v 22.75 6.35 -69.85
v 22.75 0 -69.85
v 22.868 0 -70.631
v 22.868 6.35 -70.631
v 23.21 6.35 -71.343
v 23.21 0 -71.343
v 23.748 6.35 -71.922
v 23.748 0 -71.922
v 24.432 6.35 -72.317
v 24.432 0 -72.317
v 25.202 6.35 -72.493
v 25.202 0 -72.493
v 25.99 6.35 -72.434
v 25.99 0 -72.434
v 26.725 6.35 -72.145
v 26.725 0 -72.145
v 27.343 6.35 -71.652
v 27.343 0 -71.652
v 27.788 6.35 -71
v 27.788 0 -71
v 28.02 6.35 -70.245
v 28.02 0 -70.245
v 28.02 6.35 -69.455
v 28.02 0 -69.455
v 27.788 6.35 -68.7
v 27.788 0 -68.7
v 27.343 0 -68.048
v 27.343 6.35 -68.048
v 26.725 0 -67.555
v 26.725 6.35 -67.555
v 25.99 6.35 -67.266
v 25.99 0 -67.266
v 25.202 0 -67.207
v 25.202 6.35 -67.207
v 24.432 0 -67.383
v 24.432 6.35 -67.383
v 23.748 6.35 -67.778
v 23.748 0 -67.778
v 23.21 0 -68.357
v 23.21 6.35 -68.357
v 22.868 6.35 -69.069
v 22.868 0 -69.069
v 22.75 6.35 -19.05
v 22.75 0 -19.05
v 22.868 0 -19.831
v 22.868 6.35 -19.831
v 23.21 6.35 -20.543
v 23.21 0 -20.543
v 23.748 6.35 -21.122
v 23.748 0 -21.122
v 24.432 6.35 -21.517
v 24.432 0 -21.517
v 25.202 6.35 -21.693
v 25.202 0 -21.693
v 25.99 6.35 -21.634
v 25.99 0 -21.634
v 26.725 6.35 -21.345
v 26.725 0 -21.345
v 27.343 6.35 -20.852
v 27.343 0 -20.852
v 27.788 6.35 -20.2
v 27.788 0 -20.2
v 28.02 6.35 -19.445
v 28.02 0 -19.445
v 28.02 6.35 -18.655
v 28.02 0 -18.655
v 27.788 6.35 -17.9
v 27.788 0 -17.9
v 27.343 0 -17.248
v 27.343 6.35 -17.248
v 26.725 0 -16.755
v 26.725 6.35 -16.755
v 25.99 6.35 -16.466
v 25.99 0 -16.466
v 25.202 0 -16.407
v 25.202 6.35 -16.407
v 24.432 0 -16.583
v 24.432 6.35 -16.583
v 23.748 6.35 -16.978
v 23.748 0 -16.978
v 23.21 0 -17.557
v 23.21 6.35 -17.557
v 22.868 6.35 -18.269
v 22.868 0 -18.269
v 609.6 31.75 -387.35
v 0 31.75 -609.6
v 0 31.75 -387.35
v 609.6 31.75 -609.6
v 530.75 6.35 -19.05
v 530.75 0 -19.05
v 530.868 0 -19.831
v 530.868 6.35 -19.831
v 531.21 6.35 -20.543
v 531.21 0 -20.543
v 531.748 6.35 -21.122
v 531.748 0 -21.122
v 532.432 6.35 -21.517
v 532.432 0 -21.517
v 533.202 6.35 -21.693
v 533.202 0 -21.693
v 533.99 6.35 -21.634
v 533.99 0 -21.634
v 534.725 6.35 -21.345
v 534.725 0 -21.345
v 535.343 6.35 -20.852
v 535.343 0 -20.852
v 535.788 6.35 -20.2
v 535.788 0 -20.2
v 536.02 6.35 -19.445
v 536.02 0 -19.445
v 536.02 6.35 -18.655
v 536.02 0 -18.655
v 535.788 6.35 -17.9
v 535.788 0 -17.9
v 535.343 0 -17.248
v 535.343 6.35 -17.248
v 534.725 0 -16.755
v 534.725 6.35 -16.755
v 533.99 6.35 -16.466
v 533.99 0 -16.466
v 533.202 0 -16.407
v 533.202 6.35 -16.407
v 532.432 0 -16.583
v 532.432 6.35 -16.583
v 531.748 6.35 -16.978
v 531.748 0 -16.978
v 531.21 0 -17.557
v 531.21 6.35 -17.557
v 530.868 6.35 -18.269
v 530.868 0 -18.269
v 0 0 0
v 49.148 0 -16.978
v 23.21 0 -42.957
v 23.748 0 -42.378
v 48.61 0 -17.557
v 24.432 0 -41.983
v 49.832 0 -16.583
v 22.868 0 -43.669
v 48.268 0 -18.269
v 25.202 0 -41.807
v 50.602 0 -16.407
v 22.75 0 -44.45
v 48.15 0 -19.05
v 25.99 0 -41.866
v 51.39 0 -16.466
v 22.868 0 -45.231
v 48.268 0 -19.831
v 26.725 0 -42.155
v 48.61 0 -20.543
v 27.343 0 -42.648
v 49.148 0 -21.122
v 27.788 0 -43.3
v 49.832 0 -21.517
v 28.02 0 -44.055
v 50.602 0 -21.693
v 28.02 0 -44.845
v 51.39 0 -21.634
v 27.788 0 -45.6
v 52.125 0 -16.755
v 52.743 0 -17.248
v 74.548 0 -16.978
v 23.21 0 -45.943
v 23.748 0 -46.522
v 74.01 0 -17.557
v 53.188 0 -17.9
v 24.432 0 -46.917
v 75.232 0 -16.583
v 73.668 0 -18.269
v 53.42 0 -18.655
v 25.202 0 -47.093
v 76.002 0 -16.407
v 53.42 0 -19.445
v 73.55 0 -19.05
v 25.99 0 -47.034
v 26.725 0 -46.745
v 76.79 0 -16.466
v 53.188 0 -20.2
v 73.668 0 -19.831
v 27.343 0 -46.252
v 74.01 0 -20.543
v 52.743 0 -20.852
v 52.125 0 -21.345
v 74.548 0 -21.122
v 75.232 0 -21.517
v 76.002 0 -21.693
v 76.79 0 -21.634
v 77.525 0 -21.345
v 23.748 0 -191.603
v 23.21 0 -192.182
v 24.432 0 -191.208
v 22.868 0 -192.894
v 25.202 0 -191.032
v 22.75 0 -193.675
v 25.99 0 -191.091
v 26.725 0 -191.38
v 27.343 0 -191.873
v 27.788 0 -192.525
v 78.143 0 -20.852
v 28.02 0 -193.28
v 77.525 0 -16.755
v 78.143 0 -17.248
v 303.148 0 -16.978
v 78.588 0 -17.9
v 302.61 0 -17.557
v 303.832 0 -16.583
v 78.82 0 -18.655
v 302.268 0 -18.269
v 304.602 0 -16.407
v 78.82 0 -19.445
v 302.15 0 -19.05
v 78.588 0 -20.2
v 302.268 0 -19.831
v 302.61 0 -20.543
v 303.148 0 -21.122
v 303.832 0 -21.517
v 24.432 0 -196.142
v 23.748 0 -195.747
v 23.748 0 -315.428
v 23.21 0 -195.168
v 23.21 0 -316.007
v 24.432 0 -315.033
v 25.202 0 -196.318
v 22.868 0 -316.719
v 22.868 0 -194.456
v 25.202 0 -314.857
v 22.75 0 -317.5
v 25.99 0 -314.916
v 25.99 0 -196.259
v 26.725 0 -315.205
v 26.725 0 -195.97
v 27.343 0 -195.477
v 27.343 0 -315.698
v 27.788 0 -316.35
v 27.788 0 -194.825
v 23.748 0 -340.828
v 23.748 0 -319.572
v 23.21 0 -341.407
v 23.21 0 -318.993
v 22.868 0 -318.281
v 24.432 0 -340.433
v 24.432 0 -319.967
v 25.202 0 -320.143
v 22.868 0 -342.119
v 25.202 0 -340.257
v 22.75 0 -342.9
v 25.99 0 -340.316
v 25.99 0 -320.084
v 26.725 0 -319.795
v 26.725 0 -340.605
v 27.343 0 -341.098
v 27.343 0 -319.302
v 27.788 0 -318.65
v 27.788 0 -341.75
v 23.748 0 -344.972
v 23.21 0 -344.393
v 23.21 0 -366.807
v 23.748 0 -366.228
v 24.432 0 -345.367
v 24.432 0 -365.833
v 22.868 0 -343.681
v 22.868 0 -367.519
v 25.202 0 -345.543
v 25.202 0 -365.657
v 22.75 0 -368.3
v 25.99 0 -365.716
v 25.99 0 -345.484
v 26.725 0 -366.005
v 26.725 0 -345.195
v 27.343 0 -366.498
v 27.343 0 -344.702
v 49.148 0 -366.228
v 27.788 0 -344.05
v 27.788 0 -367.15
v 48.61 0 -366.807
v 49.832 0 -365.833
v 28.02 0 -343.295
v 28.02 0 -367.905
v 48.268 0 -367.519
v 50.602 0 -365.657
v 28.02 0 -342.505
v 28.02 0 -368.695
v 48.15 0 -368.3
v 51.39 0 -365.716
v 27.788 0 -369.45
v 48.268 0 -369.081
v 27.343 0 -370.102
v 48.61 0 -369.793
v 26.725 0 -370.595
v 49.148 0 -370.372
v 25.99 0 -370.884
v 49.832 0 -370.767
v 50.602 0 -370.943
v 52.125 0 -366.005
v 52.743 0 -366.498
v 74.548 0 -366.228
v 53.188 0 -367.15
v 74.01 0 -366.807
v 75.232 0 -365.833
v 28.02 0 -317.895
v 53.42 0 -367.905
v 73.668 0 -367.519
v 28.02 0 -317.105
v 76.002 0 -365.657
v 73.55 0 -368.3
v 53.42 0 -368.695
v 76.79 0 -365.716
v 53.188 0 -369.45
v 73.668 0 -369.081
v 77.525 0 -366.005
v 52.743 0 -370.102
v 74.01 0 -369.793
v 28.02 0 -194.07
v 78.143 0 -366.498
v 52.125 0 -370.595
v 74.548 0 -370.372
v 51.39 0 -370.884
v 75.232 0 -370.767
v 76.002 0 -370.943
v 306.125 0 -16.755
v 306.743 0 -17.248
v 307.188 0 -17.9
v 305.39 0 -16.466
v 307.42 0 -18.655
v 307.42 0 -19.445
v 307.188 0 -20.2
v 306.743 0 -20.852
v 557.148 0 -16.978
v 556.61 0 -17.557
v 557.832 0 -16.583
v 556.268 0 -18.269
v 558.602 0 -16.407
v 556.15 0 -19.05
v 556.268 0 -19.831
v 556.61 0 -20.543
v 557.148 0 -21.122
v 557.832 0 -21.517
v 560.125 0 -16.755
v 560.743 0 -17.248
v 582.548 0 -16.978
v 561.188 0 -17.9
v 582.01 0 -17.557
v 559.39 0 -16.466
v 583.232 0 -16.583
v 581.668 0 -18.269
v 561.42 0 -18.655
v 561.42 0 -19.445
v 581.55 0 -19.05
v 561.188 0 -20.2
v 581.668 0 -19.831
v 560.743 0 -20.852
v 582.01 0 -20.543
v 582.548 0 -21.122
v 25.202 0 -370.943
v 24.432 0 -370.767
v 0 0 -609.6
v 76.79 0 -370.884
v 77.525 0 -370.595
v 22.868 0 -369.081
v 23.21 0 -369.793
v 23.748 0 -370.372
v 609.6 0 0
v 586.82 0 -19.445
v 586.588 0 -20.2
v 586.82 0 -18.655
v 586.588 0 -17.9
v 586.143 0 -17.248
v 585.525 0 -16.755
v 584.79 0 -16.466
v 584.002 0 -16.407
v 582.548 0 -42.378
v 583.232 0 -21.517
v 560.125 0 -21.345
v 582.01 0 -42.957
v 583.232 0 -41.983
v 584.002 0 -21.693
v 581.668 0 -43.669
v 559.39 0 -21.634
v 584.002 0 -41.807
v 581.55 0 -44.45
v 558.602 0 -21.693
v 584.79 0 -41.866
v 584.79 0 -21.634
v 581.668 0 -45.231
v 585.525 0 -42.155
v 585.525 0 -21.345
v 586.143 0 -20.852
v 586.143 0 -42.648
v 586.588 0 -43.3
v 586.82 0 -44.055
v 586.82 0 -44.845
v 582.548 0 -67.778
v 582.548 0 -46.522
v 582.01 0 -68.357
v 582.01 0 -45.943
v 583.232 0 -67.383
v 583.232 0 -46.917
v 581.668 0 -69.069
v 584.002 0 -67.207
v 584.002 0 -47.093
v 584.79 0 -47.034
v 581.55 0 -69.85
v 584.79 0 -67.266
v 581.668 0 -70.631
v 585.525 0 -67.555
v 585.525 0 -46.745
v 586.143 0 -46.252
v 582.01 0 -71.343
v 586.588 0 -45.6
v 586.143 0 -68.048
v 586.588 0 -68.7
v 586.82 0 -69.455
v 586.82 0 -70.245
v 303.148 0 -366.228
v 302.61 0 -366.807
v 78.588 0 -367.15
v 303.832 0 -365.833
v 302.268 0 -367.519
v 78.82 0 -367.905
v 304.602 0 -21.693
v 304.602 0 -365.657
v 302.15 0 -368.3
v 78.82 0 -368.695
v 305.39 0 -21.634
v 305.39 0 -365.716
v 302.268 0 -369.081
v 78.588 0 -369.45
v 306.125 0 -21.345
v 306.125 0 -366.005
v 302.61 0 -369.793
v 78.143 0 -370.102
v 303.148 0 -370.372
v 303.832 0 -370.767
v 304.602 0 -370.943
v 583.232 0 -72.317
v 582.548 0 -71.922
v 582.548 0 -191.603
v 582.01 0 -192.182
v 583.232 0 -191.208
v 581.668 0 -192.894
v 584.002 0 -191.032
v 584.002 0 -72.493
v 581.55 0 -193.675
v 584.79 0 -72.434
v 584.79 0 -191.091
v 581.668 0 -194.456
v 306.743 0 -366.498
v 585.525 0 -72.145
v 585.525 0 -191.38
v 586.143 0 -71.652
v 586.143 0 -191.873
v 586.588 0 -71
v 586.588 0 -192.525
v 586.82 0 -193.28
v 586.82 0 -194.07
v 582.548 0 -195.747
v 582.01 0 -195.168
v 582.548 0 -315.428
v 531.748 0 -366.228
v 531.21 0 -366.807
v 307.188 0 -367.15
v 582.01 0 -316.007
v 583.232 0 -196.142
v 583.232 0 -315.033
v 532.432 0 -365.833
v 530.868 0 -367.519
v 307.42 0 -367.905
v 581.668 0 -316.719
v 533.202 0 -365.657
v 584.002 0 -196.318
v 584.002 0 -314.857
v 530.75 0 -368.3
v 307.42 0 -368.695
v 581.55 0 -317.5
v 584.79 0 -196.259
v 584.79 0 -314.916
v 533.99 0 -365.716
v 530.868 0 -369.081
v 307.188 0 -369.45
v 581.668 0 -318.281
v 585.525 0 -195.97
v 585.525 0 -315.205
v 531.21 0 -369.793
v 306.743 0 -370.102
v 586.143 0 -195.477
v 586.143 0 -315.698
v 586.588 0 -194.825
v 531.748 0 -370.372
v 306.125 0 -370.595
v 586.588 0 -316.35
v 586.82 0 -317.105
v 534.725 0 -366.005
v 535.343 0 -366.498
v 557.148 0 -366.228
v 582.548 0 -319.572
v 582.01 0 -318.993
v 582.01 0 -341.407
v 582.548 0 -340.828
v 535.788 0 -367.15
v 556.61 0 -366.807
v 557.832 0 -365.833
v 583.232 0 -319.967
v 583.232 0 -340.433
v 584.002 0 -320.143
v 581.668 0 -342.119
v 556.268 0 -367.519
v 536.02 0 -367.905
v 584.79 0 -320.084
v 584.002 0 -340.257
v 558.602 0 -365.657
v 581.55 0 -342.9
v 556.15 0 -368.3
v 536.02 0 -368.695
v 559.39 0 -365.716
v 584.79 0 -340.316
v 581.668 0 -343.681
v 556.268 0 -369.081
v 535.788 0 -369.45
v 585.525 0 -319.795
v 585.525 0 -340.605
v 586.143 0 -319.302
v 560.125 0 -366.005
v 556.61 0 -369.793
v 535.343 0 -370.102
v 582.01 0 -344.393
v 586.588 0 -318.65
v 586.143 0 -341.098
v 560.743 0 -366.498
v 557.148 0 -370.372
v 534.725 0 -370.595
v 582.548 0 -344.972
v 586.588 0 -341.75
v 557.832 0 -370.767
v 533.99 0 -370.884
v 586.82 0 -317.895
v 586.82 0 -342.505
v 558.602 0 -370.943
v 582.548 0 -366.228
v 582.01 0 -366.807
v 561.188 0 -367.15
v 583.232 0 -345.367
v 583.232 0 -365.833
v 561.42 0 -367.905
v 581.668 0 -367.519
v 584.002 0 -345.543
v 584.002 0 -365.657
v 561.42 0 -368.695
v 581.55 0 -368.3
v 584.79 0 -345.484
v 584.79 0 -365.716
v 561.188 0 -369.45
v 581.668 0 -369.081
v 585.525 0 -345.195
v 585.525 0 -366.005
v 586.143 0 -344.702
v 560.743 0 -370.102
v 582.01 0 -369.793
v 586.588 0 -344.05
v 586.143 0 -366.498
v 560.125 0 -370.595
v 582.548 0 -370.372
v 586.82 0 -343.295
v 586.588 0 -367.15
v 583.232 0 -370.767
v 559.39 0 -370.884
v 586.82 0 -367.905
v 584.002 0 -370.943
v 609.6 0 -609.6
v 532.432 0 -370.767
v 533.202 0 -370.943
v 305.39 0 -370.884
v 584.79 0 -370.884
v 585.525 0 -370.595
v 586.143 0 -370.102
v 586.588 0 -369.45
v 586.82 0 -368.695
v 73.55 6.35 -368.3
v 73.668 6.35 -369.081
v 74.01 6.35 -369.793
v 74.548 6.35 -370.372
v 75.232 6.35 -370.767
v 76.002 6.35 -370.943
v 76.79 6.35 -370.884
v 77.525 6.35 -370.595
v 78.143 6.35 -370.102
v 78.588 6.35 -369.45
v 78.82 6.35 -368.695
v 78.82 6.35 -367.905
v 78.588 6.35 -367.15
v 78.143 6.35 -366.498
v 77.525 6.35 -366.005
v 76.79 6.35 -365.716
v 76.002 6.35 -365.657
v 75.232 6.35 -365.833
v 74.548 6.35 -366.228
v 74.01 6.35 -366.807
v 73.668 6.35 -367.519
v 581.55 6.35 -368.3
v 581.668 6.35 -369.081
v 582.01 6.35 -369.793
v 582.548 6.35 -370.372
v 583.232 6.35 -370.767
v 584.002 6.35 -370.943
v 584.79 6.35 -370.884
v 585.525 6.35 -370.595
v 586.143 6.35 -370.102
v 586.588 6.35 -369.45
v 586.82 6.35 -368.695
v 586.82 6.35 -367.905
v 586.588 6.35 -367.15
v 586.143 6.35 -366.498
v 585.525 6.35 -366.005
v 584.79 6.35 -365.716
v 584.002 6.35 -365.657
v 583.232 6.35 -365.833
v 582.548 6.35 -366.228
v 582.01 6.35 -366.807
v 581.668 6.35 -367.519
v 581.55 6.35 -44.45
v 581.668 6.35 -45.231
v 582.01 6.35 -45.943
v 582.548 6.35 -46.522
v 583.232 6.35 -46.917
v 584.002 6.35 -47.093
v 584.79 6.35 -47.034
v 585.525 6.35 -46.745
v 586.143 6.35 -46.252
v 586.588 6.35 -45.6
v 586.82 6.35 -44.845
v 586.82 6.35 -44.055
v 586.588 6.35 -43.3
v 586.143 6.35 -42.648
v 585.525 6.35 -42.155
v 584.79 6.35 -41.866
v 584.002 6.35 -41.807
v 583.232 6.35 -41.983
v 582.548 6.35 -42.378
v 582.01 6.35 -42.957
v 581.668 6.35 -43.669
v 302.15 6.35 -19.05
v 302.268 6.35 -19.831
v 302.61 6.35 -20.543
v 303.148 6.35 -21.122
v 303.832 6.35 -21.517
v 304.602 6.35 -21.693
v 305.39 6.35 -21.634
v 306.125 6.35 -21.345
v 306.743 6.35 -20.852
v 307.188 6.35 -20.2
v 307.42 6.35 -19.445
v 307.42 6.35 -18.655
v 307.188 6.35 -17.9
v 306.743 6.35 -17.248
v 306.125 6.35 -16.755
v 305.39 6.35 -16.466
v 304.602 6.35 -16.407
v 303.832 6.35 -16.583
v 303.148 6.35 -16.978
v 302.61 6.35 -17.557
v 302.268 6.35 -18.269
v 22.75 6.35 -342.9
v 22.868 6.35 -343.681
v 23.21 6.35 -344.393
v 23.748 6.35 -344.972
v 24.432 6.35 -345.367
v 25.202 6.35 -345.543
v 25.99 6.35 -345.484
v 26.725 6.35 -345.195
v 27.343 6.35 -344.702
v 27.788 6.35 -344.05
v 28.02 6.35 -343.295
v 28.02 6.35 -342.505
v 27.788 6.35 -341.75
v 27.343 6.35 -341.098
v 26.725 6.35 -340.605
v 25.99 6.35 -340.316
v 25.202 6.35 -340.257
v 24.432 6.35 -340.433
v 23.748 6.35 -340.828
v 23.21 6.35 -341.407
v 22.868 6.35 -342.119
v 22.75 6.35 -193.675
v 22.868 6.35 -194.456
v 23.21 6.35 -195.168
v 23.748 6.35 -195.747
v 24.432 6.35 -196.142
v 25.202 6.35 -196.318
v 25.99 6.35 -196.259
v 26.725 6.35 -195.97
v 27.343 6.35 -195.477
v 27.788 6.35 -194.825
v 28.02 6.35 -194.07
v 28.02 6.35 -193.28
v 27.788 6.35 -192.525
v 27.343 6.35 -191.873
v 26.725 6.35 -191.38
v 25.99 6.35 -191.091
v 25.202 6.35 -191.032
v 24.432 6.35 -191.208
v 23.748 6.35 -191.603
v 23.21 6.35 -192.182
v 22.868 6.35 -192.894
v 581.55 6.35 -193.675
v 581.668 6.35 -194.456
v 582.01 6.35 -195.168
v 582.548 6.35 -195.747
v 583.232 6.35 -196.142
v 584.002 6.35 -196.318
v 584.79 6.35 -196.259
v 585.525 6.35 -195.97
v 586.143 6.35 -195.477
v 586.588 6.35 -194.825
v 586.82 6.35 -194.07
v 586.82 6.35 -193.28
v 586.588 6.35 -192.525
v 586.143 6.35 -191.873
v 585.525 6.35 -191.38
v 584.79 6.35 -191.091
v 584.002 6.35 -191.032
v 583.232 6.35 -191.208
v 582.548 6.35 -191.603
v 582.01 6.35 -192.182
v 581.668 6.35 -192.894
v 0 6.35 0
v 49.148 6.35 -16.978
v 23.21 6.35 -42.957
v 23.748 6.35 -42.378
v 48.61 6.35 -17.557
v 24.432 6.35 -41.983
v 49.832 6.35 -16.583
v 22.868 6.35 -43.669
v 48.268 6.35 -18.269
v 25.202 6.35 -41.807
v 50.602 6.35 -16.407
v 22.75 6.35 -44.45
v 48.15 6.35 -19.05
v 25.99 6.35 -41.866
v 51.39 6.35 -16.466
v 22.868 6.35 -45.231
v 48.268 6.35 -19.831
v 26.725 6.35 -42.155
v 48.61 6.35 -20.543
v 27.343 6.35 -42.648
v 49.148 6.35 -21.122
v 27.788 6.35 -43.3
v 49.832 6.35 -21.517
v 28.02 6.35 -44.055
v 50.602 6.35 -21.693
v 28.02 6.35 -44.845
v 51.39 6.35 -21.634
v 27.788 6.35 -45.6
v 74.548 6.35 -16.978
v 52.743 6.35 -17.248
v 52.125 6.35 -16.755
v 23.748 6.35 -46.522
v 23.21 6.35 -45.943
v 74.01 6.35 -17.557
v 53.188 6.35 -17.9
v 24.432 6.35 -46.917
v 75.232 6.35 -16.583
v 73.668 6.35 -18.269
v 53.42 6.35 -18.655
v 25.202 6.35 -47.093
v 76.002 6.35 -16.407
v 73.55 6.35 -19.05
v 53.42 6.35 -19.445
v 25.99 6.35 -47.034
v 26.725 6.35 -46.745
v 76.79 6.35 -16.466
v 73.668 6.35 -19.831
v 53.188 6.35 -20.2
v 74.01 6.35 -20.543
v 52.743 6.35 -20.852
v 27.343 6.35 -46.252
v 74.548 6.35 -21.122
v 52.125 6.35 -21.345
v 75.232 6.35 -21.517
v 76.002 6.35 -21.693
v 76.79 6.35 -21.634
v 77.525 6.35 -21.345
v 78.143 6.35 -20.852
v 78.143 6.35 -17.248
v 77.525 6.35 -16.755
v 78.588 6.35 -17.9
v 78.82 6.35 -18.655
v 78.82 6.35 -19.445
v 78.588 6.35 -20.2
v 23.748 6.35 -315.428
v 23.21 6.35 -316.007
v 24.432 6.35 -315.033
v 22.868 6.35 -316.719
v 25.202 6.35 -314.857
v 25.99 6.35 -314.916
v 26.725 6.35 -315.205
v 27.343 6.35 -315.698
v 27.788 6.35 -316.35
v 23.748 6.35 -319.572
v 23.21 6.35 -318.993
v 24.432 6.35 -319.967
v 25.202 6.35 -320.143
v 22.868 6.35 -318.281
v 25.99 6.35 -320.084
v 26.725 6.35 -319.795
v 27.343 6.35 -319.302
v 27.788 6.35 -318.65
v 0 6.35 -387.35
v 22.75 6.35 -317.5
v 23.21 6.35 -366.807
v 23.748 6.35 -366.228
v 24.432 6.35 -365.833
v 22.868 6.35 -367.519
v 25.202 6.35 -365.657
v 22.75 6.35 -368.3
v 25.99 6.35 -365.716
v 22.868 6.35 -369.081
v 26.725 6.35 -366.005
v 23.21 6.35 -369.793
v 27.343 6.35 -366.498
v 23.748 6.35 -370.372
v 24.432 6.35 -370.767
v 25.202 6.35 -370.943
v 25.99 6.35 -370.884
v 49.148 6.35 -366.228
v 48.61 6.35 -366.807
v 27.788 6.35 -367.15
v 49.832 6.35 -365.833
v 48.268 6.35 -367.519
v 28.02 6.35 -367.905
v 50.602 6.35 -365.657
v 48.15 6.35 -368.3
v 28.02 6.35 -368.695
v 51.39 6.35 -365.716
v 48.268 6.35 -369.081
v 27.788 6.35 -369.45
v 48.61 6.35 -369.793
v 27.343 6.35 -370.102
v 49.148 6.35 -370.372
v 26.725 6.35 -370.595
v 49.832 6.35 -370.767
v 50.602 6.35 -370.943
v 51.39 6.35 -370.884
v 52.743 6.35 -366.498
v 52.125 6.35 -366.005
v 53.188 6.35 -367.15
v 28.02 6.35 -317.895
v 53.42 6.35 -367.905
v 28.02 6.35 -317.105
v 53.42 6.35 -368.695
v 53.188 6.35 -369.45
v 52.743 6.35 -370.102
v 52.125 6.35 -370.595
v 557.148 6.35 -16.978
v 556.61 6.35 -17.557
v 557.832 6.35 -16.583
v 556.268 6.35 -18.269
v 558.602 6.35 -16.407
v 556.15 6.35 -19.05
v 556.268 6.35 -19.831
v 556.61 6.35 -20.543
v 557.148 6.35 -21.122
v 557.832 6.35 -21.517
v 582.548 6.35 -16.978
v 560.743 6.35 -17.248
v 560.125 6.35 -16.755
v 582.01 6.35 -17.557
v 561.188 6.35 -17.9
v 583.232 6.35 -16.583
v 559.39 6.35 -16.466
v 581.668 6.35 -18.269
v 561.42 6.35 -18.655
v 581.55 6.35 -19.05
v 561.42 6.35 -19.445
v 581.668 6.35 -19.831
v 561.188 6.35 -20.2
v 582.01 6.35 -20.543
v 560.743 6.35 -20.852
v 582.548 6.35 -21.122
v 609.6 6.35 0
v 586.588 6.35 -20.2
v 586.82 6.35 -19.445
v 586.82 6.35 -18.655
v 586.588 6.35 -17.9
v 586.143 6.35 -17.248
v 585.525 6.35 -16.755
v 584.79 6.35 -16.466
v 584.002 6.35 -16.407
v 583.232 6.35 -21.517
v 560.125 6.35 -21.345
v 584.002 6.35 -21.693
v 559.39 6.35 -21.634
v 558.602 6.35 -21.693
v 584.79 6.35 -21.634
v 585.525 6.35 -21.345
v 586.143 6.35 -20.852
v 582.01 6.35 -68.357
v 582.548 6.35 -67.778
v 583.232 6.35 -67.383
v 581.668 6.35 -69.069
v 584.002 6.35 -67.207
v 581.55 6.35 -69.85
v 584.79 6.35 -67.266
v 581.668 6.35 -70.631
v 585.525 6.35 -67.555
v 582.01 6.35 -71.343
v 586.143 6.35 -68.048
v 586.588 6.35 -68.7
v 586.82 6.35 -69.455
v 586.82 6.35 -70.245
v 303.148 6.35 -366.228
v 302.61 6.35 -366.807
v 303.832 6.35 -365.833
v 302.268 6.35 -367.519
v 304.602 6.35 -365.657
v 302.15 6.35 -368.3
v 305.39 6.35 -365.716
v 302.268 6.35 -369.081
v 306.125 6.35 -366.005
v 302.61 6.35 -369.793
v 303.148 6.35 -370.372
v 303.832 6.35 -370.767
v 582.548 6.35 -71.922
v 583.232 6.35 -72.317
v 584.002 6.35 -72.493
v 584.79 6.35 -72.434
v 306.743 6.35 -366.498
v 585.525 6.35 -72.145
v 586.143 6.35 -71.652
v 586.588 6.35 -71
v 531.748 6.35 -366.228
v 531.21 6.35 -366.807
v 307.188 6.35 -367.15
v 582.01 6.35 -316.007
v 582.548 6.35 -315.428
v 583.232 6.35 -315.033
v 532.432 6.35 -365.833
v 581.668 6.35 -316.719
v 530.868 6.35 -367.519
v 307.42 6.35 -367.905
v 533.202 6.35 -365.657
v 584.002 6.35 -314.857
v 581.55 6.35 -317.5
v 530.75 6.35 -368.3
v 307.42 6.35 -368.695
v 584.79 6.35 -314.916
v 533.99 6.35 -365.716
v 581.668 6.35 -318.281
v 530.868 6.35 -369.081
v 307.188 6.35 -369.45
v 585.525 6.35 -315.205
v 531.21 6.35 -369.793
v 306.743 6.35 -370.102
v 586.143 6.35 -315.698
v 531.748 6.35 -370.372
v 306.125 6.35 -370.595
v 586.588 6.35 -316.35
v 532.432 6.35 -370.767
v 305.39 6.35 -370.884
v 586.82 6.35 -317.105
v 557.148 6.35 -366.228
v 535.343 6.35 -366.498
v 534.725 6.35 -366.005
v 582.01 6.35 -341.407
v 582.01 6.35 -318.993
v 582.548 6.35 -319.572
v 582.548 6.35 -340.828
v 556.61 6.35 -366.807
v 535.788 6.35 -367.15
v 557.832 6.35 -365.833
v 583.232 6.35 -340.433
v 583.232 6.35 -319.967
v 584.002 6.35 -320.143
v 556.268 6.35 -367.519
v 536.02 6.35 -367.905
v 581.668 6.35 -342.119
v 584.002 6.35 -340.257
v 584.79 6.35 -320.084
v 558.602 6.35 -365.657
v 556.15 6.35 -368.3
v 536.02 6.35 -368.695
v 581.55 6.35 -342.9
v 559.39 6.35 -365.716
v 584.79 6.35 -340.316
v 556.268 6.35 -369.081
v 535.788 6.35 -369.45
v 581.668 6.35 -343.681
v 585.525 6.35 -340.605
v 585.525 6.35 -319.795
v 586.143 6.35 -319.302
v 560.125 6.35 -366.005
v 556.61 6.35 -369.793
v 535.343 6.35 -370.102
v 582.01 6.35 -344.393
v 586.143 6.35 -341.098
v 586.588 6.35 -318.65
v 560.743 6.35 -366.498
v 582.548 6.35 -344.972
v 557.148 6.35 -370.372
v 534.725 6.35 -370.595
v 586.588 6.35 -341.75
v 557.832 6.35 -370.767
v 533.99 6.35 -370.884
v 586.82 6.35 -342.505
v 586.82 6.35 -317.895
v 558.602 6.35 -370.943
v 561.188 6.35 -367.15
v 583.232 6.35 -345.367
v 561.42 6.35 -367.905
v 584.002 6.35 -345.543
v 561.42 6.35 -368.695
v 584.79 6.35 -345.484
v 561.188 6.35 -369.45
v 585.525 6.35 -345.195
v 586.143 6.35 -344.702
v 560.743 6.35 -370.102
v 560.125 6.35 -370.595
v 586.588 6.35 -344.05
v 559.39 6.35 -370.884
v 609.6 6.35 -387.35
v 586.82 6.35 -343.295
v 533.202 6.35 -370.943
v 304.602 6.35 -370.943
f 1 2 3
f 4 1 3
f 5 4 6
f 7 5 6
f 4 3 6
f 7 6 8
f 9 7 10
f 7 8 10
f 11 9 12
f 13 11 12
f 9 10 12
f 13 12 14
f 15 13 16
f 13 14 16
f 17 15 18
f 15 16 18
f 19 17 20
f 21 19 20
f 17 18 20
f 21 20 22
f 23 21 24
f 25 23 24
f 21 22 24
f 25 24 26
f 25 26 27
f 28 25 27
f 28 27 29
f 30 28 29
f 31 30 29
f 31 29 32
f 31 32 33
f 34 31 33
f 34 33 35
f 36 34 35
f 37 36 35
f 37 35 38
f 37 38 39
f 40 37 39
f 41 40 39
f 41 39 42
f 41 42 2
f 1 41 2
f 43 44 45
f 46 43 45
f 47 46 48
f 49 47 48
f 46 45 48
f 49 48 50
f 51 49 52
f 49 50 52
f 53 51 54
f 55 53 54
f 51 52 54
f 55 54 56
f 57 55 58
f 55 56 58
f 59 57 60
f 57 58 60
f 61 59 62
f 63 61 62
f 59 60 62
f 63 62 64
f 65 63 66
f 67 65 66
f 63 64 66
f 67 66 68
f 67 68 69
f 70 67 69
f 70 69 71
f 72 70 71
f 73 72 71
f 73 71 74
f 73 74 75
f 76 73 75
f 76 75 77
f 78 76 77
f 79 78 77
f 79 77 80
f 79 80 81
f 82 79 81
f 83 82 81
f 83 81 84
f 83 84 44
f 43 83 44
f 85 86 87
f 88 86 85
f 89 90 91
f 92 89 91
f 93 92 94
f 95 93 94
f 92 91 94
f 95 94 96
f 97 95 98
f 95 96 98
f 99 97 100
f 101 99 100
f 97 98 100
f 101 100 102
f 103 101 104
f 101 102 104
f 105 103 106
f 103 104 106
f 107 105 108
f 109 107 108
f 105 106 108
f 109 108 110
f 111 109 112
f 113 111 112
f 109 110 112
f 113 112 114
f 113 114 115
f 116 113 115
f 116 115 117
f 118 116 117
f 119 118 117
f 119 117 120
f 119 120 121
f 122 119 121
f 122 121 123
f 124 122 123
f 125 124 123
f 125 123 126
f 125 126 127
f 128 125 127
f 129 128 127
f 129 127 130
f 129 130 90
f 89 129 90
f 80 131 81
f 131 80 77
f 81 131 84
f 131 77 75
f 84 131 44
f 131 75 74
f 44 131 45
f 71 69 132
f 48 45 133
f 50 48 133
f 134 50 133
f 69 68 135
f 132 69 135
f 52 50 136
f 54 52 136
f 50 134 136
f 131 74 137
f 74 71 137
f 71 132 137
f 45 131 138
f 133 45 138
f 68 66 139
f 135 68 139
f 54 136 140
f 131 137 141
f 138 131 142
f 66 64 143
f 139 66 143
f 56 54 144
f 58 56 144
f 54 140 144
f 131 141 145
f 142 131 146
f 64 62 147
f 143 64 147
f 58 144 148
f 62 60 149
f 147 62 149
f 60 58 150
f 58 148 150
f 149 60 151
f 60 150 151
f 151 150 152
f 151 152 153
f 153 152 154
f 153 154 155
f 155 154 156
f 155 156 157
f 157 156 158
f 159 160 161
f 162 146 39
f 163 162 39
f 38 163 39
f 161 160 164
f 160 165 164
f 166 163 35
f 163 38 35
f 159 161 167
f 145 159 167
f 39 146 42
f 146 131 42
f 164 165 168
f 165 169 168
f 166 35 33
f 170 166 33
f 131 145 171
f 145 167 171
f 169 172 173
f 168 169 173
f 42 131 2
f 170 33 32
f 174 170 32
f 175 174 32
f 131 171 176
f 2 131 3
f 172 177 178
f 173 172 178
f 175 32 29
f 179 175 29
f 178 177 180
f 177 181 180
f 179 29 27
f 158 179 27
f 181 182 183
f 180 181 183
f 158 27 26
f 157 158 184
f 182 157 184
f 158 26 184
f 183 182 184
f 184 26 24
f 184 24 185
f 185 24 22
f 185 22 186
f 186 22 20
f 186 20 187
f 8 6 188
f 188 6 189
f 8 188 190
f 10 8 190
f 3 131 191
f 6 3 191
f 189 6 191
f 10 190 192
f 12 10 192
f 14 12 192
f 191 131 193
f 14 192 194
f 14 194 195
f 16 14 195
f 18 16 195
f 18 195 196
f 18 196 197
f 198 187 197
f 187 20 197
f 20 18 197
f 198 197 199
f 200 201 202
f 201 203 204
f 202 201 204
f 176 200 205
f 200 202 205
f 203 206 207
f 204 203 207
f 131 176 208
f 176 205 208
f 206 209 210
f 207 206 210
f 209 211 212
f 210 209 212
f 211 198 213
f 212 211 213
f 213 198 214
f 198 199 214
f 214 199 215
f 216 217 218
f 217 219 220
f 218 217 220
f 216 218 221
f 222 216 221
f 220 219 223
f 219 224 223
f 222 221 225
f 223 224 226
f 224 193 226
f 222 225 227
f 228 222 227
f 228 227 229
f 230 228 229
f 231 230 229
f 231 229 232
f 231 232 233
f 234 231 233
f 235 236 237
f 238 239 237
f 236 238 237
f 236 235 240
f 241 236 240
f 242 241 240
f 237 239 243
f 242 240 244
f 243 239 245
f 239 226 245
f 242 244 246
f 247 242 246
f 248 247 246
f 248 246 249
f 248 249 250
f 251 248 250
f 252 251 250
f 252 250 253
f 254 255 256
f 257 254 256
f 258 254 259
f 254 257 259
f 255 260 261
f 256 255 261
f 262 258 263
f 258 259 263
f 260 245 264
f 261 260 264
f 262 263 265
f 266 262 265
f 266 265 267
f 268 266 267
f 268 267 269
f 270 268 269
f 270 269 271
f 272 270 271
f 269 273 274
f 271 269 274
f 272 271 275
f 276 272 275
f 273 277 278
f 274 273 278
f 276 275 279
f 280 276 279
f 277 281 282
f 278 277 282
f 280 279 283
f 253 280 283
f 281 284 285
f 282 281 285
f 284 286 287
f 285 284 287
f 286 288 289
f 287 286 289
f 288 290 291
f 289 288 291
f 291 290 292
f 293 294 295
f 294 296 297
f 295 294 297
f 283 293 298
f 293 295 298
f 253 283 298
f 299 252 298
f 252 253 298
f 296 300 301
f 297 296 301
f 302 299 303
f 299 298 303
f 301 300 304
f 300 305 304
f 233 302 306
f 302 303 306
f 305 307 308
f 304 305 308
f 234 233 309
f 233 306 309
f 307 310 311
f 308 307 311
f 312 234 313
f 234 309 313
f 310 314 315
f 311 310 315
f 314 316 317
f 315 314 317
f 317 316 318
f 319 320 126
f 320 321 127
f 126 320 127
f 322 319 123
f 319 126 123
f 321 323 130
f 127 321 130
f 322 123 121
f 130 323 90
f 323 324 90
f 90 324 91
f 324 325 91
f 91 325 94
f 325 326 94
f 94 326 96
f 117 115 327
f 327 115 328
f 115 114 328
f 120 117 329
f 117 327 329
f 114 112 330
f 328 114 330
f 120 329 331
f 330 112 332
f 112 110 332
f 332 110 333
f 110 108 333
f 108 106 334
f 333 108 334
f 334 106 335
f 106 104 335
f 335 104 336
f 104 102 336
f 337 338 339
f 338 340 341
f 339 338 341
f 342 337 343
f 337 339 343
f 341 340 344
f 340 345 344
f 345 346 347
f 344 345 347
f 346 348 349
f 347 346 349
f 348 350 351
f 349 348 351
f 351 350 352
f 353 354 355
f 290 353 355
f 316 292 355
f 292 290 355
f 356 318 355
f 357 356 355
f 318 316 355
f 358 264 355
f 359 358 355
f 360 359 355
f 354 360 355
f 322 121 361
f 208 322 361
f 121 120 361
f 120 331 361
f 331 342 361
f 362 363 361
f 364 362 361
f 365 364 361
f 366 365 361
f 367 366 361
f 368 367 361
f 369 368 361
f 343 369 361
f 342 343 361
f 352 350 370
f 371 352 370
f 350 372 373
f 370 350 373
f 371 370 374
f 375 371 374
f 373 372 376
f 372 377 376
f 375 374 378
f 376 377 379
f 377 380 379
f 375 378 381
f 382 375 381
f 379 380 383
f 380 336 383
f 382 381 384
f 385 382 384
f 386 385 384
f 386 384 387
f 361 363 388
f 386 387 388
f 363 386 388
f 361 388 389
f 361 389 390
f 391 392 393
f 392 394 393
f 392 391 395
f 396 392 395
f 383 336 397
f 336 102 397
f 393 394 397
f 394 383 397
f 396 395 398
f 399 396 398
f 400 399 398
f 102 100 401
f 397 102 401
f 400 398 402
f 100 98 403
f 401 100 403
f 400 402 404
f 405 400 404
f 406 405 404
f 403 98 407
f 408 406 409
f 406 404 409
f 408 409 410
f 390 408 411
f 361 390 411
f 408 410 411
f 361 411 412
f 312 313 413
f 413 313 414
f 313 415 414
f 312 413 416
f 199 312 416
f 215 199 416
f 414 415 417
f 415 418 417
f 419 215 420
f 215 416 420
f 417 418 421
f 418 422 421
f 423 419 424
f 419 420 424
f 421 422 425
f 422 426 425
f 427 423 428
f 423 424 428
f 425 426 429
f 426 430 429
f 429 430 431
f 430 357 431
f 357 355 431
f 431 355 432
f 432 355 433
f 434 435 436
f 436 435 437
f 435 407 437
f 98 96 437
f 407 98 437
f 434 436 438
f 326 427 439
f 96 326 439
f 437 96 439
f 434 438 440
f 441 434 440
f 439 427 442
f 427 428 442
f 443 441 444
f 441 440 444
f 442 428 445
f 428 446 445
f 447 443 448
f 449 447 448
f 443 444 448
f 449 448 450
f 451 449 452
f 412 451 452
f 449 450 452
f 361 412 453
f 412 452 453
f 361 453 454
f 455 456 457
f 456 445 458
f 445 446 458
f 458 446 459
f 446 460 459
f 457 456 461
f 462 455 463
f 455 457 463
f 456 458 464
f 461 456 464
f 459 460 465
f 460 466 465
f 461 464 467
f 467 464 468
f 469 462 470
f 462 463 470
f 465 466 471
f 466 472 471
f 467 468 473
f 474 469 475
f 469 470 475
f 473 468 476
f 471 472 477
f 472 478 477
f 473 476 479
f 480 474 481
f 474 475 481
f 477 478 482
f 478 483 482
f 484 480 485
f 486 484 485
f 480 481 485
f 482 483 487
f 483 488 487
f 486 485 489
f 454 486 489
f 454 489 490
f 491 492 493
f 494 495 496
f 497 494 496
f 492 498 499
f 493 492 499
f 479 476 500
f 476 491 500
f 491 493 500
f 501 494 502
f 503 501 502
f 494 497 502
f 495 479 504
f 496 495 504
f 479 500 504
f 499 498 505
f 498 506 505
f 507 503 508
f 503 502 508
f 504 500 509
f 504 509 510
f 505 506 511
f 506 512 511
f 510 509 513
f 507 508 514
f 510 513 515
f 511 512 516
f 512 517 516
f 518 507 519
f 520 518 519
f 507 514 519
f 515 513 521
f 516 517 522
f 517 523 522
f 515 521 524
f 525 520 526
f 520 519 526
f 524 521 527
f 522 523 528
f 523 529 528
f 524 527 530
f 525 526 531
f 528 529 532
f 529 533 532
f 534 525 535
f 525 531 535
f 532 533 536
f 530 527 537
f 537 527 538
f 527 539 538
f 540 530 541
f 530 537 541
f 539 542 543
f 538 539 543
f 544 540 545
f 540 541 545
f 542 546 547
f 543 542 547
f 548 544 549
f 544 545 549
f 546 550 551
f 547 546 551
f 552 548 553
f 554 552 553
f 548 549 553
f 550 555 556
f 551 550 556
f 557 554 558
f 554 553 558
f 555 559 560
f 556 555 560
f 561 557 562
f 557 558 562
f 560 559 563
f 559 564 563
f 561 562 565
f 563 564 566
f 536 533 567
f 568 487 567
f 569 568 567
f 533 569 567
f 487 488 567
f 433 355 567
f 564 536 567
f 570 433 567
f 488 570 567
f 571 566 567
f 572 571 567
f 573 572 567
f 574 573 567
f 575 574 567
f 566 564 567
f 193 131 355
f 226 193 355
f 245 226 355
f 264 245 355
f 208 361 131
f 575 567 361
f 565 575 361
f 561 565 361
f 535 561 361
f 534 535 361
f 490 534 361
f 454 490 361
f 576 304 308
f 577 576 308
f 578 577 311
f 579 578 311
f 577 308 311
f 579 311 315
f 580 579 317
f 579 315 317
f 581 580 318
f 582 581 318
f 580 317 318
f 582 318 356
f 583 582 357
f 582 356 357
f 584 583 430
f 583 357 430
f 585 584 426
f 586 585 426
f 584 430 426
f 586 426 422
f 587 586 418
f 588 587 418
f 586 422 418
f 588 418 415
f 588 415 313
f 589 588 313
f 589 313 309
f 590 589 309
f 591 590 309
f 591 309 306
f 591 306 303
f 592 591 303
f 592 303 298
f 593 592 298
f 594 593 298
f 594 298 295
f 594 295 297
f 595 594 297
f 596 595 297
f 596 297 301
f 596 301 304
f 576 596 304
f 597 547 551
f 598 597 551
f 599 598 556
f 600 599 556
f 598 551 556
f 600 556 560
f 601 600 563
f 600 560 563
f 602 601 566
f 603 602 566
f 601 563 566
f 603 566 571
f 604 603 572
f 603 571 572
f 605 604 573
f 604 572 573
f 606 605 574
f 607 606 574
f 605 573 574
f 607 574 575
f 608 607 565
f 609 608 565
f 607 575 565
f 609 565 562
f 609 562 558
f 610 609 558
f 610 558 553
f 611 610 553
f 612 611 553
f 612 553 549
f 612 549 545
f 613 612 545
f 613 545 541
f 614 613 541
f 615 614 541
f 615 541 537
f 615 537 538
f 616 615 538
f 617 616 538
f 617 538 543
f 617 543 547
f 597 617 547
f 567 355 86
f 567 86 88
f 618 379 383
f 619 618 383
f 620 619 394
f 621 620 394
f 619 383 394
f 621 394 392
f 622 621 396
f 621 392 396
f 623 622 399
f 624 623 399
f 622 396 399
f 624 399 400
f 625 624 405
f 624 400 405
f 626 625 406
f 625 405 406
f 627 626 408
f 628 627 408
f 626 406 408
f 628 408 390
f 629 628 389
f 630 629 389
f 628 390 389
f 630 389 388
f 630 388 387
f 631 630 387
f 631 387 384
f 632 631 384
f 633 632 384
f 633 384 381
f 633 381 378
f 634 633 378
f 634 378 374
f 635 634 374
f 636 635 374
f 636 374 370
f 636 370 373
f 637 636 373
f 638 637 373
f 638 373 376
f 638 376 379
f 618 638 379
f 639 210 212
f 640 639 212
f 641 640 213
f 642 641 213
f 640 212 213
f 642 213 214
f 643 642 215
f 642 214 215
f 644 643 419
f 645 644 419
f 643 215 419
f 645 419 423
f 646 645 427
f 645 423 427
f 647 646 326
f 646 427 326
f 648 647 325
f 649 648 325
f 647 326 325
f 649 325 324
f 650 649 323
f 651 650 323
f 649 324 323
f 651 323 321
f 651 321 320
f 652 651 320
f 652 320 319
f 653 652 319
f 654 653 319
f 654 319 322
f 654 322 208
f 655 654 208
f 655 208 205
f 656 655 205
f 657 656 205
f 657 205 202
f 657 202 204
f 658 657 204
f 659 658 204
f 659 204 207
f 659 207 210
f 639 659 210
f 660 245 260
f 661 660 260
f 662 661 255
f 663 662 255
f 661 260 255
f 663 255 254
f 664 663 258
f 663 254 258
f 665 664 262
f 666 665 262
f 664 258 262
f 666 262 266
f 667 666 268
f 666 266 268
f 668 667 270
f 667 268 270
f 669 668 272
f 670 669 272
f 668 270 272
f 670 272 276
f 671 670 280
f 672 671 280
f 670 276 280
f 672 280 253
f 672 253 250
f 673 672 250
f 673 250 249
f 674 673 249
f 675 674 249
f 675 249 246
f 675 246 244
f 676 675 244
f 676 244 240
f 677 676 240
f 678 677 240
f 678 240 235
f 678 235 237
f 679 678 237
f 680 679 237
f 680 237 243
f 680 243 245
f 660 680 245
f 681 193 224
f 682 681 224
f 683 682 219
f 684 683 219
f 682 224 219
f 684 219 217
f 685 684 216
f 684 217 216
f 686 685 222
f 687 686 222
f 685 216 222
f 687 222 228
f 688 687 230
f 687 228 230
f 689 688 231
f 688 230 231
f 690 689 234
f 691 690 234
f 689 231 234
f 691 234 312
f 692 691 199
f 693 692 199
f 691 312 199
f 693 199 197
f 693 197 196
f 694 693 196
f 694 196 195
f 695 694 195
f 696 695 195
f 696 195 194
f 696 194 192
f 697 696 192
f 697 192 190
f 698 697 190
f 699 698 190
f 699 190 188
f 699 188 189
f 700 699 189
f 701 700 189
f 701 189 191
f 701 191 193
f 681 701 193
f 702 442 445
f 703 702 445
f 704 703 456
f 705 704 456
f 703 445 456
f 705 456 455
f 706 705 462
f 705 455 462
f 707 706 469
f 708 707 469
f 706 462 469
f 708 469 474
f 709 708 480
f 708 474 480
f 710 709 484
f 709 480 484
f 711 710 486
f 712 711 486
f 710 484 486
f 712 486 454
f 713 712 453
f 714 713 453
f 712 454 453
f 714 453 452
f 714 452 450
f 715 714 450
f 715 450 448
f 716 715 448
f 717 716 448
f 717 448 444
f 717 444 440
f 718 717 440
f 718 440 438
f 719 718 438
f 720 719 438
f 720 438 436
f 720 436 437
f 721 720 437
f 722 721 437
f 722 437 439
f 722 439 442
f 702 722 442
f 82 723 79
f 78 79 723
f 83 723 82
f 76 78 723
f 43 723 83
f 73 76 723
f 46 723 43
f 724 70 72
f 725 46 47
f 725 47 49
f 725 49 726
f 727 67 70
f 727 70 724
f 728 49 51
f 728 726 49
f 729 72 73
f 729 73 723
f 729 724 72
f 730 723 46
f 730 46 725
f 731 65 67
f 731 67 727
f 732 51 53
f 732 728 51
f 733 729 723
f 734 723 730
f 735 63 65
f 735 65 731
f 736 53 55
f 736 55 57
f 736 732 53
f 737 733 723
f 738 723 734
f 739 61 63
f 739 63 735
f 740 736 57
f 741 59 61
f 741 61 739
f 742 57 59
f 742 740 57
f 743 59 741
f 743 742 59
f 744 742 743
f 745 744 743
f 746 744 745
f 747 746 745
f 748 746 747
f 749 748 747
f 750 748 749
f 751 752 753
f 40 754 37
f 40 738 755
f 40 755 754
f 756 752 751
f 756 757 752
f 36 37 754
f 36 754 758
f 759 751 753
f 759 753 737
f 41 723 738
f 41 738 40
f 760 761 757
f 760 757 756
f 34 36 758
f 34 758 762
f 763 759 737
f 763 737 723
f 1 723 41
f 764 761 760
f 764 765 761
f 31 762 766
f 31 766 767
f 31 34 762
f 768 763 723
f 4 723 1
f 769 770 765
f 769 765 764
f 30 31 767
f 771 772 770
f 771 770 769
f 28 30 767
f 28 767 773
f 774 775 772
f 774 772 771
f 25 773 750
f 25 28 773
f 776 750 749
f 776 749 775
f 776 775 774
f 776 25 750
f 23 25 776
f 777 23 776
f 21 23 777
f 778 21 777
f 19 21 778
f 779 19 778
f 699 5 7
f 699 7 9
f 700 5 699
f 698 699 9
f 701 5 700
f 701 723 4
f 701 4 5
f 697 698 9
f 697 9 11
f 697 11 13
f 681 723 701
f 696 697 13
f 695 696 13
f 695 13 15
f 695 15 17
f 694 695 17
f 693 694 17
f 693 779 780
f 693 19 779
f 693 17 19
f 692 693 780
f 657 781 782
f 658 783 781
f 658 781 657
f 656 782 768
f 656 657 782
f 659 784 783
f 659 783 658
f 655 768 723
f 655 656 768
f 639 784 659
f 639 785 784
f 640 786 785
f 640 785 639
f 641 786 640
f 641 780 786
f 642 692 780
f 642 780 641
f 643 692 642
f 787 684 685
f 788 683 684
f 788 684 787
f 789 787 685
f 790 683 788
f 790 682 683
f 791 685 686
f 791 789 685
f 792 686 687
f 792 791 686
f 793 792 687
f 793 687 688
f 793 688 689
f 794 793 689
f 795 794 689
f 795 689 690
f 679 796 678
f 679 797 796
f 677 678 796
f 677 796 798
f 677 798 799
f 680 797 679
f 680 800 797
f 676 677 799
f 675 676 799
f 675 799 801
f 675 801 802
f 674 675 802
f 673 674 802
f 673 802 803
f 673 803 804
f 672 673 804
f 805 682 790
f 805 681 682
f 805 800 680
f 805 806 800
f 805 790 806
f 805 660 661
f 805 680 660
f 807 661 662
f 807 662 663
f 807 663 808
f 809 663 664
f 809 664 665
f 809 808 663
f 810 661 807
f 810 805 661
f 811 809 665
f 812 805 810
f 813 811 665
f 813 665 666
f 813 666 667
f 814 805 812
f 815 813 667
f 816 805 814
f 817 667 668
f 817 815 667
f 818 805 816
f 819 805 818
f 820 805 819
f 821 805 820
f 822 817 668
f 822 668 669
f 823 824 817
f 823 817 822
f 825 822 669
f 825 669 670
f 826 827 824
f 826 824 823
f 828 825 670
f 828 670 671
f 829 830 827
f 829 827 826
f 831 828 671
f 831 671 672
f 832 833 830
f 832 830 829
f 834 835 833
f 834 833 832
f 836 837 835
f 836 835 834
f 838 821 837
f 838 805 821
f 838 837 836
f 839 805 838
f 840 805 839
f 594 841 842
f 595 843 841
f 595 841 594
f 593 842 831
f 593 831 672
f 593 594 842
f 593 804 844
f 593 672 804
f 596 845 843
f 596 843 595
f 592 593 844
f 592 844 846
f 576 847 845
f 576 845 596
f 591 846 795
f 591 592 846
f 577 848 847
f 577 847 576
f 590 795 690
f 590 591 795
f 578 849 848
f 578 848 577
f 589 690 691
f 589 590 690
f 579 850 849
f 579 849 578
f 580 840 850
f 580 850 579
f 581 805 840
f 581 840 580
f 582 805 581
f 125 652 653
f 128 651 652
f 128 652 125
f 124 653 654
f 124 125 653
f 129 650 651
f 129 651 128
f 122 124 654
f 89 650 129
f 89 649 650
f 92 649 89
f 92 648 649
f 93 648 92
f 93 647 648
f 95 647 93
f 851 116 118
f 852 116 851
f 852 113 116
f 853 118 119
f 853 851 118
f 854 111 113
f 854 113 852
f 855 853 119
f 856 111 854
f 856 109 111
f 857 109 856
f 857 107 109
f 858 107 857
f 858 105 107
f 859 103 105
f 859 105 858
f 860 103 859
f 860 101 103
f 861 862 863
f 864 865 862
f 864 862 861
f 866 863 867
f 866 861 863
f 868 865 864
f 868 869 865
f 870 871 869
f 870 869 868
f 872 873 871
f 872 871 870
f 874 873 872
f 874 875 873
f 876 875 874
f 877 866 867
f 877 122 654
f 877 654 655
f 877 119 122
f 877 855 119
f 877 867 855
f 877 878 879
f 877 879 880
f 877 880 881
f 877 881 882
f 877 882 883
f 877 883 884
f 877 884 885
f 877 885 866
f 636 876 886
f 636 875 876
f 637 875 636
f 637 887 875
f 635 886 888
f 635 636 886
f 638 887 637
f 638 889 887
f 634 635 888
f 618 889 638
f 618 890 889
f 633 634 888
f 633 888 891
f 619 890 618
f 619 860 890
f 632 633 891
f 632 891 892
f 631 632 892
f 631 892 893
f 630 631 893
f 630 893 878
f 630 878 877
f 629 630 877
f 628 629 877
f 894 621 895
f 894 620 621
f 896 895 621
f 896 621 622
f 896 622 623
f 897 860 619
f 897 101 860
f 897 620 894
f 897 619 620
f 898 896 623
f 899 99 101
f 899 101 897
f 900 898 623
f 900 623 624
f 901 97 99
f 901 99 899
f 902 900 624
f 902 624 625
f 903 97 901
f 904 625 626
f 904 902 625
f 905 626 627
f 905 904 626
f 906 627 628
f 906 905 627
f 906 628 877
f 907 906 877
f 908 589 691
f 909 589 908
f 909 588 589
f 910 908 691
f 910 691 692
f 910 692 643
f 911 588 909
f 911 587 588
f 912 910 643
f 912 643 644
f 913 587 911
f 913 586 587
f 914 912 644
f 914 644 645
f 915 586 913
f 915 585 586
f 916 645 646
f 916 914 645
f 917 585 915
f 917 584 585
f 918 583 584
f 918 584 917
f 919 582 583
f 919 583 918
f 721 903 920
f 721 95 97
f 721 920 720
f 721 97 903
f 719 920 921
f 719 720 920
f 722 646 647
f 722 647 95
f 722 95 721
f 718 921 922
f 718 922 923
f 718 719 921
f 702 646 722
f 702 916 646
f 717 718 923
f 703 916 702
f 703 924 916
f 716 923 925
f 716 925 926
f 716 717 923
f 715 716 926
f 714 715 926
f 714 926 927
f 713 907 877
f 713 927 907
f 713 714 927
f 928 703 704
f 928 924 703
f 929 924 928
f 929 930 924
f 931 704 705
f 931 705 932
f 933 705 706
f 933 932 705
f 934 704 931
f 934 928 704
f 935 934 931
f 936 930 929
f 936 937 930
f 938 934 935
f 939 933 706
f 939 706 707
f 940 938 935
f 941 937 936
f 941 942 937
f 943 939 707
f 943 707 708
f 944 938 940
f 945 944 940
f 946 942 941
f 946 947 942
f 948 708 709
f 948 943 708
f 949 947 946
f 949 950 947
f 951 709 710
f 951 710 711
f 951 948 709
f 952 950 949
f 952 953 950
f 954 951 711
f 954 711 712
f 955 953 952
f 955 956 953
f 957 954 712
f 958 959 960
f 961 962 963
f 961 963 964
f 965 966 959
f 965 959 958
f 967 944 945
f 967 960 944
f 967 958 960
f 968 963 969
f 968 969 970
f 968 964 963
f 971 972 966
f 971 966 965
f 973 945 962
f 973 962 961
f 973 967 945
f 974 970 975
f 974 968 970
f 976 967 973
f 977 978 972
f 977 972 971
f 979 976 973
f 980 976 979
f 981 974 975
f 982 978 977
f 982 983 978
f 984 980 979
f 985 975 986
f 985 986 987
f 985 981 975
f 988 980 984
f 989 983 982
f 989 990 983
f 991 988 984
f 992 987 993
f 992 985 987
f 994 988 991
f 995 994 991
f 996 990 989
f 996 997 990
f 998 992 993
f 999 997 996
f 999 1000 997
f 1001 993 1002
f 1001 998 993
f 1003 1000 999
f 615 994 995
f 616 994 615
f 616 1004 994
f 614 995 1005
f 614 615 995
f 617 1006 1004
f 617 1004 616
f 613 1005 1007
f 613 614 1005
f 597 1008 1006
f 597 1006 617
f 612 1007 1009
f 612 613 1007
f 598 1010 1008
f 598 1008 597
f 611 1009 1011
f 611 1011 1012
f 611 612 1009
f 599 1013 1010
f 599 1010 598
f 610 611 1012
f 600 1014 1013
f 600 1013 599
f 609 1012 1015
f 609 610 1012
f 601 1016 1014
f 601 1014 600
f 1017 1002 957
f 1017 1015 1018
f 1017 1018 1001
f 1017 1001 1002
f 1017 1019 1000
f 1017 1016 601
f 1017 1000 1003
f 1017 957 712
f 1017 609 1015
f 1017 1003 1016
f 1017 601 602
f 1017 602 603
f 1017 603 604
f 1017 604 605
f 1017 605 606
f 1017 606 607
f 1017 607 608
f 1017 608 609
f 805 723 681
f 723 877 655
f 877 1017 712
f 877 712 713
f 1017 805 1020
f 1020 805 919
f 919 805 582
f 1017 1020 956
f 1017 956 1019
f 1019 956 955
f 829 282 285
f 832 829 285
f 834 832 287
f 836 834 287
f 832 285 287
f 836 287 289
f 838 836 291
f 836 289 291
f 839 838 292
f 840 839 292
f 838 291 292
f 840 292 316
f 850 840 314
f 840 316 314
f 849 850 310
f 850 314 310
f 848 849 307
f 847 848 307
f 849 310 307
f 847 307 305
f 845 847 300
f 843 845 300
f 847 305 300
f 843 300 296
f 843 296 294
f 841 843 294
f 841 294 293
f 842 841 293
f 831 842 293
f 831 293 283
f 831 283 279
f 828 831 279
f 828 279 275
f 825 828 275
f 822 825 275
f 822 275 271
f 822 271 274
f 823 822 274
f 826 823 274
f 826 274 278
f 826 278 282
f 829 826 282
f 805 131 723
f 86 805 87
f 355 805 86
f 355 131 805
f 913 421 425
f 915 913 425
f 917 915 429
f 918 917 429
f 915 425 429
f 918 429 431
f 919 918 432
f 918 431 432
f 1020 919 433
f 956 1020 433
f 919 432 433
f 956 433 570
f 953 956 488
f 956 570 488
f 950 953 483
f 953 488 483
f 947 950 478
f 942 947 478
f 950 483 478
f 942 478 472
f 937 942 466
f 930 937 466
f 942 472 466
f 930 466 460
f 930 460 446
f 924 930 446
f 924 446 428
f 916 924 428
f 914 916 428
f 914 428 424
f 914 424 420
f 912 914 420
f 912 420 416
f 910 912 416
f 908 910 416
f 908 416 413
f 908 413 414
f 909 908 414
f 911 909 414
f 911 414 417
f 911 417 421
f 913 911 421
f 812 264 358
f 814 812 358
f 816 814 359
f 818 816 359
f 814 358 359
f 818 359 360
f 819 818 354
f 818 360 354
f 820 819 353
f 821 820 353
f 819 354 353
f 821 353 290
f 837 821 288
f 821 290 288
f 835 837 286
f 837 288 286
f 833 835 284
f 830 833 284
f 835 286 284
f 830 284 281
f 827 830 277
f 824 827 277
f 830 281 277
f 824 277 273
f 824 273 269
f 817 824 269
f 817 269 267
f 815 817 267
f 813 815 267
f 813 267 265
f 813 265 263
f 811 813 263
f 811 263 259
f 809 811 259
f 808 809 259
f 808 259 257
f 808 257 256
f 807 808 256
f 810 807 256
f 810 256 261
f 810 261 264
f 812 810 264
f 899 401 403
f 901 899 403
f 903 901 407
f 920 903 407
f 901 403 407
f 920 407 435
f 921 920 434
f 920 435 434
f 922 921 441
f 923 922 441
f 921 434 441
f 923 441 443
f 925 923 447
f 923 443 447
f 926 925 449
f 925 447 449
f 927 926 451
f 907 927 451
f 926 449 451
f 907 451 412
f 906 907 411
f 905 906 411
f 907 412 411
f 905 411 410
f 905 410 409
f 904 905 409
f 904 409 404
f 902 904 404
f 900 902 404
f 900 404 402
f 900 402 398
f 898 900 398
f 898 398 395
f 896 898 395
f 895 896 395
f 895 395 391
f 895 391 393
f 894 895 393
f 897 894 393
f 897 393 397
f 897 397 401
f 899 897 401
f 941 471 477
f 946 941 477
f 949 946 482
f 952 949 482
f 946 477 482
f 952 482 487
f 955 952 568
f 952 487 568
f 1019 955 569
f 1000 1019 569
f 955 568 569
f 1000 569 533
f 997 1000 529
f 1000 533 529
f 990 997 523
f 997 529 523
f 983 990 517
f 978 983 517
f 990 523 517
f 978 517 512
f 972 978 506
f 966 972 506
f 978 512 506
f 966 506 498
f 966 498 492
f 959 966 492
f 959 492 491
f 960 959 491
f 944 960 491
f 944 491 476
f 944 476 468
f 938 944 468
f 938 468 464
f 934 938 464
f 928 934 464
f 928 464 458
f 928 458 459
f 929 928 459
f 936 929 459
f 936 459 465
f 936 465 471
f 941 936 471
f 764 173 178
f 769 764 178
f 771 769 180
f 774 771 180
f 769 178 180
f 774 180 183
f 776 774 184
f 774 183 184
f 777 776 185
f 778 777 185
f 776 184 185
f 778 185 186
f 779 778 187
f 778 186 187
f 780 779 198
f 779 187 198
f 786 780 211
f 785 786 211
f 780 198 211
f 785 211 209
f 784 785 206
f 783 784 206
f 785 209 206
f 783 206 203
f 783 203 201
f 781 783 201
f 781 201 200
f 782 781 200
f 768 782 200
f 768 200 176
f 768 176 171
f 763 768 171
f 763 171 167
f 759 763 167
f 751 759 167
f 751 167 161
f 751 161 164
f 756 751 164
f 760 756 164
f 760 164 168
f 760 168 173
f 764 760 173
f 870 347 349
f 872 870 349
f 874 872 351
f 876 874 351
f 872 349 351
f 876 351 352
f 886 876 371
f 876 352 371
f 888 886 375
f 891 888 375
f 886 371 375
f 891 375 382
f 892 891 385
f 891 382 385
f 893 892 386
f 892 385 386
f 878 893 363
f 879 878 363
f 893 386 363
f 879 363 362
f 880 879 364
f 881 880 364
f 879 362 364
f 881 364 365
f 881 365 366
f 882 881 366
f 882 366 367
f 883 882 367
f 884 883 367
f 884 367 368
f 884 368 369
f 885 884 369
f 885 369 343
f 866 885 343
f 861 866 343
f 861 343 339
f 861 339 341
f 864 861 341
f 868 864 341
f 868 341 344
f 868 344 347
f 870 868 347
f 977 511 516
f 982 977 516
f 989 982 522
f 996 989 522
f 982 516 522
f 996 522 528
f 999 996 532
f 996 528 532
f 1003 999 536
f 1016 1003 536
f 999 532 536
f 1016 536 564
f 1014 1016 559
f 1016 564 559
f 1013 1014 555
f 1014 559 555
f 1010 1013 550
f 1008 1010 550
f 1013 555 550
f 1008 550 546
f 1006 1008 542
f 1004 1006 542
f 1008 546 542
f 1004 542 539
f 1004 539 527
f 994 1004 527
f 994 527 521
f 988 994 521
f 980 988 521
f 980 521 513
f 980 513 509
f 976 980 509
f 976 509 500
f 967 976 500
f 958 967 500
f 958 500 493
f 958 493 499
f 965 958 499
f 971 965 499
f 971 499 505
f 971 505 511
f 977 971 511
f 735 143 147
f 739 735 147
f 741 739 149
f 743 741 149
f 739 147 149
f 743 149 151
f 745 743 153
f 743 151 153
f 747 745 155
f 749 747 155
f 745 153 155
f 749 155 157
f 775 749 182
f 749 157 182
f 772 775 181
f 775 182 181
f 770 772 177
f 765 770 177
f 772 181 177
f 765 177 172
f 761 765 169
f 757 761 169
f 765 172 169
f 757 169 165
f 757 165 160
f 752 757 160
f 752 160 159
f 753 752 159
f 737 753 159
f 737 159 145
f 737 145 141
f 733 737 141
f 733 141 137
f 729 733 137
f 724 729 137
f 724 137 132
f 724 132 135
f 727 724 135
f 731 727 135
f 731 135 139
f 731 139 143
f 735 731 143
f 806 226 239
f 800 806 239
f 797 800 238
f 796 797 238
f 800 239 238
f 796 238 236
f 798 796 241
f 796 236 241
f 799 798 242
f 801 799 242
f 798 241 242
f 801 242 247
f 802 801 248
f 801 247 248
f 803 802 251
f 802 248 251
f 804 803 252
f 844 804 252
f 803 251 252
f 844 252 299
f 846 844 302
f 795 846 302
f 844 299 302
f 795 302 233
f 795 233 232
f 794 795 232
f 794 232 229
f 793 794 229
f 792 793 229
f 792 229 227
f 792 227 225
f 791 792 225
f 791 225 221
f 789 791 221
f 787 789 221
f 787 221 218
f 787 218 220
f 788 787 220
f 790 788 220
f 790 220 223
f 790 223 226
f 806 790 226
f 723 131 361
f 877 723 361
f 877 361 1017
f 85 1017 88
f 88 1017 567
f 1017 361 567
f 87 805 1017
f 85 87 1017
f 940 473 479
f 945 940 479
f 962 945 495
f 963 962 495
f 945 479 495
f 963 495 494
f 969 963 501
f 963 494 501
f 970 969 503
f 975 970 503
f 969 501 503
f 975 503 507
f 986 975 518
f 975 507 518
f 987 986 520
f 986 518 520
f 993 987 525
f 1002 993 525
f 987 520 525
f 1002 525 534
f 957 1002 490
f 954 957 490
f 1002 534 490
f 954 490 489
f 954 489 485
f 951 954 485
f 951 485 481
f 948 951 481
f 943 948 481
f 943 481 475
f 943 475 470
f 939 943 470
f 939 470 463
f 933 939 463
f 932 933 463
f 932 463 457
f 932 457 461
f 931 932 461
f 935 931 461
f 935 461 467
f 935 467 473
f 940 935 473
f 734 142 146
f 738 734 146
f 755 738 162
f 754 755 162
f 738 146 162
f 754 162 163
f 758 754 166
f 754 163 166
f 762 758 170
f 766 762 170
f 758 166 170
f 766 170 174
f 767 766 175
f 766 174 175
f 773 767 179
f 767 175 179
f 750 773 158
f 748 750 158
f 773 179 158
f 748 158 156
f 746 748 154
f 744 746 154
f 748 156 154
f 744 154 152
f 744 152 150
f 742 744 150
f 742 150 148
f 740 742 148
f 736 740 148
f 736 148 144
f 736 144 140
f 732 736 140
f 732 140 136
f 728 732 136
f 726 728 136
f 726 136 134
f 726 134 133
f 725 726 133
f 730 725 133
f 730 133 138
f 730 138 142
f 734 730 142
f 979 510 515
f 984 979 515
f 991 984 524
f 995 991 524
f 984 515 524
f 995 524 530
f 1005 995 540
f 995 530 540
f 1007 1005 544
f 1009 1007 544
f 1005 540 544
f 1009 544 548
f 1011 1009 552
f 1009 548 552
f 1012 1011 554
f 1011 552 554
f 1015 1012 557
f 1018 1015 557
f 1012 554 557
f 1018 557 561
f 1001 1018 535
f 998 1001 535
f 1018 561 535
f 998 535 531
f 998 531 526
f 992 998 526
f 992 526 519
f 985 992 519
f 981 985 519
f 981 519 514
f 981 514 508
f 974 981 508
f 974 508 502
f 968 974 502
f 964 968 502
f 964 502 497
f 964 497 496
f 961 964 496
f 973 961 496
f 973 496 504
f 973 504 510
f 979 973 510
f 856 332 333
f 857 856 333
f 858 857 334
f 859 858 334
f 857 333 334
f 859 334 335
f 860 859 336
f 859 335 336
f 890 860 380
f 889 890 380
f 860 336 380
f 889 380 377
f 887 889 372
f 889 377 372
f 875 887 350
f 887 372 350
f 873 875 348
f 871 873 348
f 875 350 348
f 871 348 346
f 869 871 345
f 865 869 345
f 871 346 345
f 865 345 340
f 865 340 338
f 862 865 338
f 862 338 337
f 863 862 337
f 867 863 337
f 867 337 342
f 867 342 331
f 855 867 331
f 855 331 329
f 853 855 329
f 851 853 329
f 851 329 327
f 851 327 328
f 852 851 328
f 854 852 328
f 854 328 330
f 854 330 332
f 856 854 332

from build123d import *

# Parameters (mm, degrees)
SKETCH1_W                  = 609.6
SKETCH1_H                  = 609.6
BOSS_EXTRUDE1_DEPTH        = 6.35
SKETCH2_W                  = 609.6
SKETCH2_H                  = 222.25
BOSS_EXTRUDE2_DEPTH        = 25.4
F_5_3_5_3_DIAMETER_HOLE1_D = 5.3


with BuildPart() as part:
    # Sketch1 → Boss-Extrude1 (new body)
    with BuildSketch(Plane(origin=(0, 0, 0), x_dir=(1, 0, 0), z_dir=(0, 1, 0))):
        with Locations((304.8, 304.8)):
            Rectangle(SKETCH1_W, SKETCH1_H)
    extrude(amount=BOSS_EXTRUDE1_DEPTH)

    # Sketch2 → Boss-Extrude2 (add)
    with BuildSketch(Plane(origin=(0, 6.35, 0), x_dir=(1, 0, 0), z_dir=(0, 1, 0))):
        with Locations((304.8, 498.475)):
            Rectangle(SKETCH2_W, SKETCH2_H)
    extrude(amount=BOSS_EXTRUDE2_DEPTH)

    # Ø5.3 (5.3) Diameter Hole1 (through all)
    with Locations(Plane(origin=(0, 6.35, 0), x_dir=(1, 0, 0), z_dir=(0, 1, 0))):
        with Locations((25.4, 368.3), (50.8, 368.3), (76.2, 368.3), (25.4, 342.9), (25.4, 317.5), (25.4, 69.85), (25.4, 44.45), (25.4, 19.05), (50.8, 19.05), (76.2, 19.05), (304.8, 19.05), (25.4, 193.675), (304.8, 368.3), (584.2, 193.675), (533.4, 368.3), (558.8, 368.3), (584.2, 368.3), (584.2, 342.9), (584.2, 317.5), (584.2, 69.85), (584.2, 44.45), (584.2, 19.05), (558.8, 19.05), (533.4, 19.05)):
            Hole(F_5_3_5_3_DIAMETER_HOLE1_D / 2)


solid = part.part
